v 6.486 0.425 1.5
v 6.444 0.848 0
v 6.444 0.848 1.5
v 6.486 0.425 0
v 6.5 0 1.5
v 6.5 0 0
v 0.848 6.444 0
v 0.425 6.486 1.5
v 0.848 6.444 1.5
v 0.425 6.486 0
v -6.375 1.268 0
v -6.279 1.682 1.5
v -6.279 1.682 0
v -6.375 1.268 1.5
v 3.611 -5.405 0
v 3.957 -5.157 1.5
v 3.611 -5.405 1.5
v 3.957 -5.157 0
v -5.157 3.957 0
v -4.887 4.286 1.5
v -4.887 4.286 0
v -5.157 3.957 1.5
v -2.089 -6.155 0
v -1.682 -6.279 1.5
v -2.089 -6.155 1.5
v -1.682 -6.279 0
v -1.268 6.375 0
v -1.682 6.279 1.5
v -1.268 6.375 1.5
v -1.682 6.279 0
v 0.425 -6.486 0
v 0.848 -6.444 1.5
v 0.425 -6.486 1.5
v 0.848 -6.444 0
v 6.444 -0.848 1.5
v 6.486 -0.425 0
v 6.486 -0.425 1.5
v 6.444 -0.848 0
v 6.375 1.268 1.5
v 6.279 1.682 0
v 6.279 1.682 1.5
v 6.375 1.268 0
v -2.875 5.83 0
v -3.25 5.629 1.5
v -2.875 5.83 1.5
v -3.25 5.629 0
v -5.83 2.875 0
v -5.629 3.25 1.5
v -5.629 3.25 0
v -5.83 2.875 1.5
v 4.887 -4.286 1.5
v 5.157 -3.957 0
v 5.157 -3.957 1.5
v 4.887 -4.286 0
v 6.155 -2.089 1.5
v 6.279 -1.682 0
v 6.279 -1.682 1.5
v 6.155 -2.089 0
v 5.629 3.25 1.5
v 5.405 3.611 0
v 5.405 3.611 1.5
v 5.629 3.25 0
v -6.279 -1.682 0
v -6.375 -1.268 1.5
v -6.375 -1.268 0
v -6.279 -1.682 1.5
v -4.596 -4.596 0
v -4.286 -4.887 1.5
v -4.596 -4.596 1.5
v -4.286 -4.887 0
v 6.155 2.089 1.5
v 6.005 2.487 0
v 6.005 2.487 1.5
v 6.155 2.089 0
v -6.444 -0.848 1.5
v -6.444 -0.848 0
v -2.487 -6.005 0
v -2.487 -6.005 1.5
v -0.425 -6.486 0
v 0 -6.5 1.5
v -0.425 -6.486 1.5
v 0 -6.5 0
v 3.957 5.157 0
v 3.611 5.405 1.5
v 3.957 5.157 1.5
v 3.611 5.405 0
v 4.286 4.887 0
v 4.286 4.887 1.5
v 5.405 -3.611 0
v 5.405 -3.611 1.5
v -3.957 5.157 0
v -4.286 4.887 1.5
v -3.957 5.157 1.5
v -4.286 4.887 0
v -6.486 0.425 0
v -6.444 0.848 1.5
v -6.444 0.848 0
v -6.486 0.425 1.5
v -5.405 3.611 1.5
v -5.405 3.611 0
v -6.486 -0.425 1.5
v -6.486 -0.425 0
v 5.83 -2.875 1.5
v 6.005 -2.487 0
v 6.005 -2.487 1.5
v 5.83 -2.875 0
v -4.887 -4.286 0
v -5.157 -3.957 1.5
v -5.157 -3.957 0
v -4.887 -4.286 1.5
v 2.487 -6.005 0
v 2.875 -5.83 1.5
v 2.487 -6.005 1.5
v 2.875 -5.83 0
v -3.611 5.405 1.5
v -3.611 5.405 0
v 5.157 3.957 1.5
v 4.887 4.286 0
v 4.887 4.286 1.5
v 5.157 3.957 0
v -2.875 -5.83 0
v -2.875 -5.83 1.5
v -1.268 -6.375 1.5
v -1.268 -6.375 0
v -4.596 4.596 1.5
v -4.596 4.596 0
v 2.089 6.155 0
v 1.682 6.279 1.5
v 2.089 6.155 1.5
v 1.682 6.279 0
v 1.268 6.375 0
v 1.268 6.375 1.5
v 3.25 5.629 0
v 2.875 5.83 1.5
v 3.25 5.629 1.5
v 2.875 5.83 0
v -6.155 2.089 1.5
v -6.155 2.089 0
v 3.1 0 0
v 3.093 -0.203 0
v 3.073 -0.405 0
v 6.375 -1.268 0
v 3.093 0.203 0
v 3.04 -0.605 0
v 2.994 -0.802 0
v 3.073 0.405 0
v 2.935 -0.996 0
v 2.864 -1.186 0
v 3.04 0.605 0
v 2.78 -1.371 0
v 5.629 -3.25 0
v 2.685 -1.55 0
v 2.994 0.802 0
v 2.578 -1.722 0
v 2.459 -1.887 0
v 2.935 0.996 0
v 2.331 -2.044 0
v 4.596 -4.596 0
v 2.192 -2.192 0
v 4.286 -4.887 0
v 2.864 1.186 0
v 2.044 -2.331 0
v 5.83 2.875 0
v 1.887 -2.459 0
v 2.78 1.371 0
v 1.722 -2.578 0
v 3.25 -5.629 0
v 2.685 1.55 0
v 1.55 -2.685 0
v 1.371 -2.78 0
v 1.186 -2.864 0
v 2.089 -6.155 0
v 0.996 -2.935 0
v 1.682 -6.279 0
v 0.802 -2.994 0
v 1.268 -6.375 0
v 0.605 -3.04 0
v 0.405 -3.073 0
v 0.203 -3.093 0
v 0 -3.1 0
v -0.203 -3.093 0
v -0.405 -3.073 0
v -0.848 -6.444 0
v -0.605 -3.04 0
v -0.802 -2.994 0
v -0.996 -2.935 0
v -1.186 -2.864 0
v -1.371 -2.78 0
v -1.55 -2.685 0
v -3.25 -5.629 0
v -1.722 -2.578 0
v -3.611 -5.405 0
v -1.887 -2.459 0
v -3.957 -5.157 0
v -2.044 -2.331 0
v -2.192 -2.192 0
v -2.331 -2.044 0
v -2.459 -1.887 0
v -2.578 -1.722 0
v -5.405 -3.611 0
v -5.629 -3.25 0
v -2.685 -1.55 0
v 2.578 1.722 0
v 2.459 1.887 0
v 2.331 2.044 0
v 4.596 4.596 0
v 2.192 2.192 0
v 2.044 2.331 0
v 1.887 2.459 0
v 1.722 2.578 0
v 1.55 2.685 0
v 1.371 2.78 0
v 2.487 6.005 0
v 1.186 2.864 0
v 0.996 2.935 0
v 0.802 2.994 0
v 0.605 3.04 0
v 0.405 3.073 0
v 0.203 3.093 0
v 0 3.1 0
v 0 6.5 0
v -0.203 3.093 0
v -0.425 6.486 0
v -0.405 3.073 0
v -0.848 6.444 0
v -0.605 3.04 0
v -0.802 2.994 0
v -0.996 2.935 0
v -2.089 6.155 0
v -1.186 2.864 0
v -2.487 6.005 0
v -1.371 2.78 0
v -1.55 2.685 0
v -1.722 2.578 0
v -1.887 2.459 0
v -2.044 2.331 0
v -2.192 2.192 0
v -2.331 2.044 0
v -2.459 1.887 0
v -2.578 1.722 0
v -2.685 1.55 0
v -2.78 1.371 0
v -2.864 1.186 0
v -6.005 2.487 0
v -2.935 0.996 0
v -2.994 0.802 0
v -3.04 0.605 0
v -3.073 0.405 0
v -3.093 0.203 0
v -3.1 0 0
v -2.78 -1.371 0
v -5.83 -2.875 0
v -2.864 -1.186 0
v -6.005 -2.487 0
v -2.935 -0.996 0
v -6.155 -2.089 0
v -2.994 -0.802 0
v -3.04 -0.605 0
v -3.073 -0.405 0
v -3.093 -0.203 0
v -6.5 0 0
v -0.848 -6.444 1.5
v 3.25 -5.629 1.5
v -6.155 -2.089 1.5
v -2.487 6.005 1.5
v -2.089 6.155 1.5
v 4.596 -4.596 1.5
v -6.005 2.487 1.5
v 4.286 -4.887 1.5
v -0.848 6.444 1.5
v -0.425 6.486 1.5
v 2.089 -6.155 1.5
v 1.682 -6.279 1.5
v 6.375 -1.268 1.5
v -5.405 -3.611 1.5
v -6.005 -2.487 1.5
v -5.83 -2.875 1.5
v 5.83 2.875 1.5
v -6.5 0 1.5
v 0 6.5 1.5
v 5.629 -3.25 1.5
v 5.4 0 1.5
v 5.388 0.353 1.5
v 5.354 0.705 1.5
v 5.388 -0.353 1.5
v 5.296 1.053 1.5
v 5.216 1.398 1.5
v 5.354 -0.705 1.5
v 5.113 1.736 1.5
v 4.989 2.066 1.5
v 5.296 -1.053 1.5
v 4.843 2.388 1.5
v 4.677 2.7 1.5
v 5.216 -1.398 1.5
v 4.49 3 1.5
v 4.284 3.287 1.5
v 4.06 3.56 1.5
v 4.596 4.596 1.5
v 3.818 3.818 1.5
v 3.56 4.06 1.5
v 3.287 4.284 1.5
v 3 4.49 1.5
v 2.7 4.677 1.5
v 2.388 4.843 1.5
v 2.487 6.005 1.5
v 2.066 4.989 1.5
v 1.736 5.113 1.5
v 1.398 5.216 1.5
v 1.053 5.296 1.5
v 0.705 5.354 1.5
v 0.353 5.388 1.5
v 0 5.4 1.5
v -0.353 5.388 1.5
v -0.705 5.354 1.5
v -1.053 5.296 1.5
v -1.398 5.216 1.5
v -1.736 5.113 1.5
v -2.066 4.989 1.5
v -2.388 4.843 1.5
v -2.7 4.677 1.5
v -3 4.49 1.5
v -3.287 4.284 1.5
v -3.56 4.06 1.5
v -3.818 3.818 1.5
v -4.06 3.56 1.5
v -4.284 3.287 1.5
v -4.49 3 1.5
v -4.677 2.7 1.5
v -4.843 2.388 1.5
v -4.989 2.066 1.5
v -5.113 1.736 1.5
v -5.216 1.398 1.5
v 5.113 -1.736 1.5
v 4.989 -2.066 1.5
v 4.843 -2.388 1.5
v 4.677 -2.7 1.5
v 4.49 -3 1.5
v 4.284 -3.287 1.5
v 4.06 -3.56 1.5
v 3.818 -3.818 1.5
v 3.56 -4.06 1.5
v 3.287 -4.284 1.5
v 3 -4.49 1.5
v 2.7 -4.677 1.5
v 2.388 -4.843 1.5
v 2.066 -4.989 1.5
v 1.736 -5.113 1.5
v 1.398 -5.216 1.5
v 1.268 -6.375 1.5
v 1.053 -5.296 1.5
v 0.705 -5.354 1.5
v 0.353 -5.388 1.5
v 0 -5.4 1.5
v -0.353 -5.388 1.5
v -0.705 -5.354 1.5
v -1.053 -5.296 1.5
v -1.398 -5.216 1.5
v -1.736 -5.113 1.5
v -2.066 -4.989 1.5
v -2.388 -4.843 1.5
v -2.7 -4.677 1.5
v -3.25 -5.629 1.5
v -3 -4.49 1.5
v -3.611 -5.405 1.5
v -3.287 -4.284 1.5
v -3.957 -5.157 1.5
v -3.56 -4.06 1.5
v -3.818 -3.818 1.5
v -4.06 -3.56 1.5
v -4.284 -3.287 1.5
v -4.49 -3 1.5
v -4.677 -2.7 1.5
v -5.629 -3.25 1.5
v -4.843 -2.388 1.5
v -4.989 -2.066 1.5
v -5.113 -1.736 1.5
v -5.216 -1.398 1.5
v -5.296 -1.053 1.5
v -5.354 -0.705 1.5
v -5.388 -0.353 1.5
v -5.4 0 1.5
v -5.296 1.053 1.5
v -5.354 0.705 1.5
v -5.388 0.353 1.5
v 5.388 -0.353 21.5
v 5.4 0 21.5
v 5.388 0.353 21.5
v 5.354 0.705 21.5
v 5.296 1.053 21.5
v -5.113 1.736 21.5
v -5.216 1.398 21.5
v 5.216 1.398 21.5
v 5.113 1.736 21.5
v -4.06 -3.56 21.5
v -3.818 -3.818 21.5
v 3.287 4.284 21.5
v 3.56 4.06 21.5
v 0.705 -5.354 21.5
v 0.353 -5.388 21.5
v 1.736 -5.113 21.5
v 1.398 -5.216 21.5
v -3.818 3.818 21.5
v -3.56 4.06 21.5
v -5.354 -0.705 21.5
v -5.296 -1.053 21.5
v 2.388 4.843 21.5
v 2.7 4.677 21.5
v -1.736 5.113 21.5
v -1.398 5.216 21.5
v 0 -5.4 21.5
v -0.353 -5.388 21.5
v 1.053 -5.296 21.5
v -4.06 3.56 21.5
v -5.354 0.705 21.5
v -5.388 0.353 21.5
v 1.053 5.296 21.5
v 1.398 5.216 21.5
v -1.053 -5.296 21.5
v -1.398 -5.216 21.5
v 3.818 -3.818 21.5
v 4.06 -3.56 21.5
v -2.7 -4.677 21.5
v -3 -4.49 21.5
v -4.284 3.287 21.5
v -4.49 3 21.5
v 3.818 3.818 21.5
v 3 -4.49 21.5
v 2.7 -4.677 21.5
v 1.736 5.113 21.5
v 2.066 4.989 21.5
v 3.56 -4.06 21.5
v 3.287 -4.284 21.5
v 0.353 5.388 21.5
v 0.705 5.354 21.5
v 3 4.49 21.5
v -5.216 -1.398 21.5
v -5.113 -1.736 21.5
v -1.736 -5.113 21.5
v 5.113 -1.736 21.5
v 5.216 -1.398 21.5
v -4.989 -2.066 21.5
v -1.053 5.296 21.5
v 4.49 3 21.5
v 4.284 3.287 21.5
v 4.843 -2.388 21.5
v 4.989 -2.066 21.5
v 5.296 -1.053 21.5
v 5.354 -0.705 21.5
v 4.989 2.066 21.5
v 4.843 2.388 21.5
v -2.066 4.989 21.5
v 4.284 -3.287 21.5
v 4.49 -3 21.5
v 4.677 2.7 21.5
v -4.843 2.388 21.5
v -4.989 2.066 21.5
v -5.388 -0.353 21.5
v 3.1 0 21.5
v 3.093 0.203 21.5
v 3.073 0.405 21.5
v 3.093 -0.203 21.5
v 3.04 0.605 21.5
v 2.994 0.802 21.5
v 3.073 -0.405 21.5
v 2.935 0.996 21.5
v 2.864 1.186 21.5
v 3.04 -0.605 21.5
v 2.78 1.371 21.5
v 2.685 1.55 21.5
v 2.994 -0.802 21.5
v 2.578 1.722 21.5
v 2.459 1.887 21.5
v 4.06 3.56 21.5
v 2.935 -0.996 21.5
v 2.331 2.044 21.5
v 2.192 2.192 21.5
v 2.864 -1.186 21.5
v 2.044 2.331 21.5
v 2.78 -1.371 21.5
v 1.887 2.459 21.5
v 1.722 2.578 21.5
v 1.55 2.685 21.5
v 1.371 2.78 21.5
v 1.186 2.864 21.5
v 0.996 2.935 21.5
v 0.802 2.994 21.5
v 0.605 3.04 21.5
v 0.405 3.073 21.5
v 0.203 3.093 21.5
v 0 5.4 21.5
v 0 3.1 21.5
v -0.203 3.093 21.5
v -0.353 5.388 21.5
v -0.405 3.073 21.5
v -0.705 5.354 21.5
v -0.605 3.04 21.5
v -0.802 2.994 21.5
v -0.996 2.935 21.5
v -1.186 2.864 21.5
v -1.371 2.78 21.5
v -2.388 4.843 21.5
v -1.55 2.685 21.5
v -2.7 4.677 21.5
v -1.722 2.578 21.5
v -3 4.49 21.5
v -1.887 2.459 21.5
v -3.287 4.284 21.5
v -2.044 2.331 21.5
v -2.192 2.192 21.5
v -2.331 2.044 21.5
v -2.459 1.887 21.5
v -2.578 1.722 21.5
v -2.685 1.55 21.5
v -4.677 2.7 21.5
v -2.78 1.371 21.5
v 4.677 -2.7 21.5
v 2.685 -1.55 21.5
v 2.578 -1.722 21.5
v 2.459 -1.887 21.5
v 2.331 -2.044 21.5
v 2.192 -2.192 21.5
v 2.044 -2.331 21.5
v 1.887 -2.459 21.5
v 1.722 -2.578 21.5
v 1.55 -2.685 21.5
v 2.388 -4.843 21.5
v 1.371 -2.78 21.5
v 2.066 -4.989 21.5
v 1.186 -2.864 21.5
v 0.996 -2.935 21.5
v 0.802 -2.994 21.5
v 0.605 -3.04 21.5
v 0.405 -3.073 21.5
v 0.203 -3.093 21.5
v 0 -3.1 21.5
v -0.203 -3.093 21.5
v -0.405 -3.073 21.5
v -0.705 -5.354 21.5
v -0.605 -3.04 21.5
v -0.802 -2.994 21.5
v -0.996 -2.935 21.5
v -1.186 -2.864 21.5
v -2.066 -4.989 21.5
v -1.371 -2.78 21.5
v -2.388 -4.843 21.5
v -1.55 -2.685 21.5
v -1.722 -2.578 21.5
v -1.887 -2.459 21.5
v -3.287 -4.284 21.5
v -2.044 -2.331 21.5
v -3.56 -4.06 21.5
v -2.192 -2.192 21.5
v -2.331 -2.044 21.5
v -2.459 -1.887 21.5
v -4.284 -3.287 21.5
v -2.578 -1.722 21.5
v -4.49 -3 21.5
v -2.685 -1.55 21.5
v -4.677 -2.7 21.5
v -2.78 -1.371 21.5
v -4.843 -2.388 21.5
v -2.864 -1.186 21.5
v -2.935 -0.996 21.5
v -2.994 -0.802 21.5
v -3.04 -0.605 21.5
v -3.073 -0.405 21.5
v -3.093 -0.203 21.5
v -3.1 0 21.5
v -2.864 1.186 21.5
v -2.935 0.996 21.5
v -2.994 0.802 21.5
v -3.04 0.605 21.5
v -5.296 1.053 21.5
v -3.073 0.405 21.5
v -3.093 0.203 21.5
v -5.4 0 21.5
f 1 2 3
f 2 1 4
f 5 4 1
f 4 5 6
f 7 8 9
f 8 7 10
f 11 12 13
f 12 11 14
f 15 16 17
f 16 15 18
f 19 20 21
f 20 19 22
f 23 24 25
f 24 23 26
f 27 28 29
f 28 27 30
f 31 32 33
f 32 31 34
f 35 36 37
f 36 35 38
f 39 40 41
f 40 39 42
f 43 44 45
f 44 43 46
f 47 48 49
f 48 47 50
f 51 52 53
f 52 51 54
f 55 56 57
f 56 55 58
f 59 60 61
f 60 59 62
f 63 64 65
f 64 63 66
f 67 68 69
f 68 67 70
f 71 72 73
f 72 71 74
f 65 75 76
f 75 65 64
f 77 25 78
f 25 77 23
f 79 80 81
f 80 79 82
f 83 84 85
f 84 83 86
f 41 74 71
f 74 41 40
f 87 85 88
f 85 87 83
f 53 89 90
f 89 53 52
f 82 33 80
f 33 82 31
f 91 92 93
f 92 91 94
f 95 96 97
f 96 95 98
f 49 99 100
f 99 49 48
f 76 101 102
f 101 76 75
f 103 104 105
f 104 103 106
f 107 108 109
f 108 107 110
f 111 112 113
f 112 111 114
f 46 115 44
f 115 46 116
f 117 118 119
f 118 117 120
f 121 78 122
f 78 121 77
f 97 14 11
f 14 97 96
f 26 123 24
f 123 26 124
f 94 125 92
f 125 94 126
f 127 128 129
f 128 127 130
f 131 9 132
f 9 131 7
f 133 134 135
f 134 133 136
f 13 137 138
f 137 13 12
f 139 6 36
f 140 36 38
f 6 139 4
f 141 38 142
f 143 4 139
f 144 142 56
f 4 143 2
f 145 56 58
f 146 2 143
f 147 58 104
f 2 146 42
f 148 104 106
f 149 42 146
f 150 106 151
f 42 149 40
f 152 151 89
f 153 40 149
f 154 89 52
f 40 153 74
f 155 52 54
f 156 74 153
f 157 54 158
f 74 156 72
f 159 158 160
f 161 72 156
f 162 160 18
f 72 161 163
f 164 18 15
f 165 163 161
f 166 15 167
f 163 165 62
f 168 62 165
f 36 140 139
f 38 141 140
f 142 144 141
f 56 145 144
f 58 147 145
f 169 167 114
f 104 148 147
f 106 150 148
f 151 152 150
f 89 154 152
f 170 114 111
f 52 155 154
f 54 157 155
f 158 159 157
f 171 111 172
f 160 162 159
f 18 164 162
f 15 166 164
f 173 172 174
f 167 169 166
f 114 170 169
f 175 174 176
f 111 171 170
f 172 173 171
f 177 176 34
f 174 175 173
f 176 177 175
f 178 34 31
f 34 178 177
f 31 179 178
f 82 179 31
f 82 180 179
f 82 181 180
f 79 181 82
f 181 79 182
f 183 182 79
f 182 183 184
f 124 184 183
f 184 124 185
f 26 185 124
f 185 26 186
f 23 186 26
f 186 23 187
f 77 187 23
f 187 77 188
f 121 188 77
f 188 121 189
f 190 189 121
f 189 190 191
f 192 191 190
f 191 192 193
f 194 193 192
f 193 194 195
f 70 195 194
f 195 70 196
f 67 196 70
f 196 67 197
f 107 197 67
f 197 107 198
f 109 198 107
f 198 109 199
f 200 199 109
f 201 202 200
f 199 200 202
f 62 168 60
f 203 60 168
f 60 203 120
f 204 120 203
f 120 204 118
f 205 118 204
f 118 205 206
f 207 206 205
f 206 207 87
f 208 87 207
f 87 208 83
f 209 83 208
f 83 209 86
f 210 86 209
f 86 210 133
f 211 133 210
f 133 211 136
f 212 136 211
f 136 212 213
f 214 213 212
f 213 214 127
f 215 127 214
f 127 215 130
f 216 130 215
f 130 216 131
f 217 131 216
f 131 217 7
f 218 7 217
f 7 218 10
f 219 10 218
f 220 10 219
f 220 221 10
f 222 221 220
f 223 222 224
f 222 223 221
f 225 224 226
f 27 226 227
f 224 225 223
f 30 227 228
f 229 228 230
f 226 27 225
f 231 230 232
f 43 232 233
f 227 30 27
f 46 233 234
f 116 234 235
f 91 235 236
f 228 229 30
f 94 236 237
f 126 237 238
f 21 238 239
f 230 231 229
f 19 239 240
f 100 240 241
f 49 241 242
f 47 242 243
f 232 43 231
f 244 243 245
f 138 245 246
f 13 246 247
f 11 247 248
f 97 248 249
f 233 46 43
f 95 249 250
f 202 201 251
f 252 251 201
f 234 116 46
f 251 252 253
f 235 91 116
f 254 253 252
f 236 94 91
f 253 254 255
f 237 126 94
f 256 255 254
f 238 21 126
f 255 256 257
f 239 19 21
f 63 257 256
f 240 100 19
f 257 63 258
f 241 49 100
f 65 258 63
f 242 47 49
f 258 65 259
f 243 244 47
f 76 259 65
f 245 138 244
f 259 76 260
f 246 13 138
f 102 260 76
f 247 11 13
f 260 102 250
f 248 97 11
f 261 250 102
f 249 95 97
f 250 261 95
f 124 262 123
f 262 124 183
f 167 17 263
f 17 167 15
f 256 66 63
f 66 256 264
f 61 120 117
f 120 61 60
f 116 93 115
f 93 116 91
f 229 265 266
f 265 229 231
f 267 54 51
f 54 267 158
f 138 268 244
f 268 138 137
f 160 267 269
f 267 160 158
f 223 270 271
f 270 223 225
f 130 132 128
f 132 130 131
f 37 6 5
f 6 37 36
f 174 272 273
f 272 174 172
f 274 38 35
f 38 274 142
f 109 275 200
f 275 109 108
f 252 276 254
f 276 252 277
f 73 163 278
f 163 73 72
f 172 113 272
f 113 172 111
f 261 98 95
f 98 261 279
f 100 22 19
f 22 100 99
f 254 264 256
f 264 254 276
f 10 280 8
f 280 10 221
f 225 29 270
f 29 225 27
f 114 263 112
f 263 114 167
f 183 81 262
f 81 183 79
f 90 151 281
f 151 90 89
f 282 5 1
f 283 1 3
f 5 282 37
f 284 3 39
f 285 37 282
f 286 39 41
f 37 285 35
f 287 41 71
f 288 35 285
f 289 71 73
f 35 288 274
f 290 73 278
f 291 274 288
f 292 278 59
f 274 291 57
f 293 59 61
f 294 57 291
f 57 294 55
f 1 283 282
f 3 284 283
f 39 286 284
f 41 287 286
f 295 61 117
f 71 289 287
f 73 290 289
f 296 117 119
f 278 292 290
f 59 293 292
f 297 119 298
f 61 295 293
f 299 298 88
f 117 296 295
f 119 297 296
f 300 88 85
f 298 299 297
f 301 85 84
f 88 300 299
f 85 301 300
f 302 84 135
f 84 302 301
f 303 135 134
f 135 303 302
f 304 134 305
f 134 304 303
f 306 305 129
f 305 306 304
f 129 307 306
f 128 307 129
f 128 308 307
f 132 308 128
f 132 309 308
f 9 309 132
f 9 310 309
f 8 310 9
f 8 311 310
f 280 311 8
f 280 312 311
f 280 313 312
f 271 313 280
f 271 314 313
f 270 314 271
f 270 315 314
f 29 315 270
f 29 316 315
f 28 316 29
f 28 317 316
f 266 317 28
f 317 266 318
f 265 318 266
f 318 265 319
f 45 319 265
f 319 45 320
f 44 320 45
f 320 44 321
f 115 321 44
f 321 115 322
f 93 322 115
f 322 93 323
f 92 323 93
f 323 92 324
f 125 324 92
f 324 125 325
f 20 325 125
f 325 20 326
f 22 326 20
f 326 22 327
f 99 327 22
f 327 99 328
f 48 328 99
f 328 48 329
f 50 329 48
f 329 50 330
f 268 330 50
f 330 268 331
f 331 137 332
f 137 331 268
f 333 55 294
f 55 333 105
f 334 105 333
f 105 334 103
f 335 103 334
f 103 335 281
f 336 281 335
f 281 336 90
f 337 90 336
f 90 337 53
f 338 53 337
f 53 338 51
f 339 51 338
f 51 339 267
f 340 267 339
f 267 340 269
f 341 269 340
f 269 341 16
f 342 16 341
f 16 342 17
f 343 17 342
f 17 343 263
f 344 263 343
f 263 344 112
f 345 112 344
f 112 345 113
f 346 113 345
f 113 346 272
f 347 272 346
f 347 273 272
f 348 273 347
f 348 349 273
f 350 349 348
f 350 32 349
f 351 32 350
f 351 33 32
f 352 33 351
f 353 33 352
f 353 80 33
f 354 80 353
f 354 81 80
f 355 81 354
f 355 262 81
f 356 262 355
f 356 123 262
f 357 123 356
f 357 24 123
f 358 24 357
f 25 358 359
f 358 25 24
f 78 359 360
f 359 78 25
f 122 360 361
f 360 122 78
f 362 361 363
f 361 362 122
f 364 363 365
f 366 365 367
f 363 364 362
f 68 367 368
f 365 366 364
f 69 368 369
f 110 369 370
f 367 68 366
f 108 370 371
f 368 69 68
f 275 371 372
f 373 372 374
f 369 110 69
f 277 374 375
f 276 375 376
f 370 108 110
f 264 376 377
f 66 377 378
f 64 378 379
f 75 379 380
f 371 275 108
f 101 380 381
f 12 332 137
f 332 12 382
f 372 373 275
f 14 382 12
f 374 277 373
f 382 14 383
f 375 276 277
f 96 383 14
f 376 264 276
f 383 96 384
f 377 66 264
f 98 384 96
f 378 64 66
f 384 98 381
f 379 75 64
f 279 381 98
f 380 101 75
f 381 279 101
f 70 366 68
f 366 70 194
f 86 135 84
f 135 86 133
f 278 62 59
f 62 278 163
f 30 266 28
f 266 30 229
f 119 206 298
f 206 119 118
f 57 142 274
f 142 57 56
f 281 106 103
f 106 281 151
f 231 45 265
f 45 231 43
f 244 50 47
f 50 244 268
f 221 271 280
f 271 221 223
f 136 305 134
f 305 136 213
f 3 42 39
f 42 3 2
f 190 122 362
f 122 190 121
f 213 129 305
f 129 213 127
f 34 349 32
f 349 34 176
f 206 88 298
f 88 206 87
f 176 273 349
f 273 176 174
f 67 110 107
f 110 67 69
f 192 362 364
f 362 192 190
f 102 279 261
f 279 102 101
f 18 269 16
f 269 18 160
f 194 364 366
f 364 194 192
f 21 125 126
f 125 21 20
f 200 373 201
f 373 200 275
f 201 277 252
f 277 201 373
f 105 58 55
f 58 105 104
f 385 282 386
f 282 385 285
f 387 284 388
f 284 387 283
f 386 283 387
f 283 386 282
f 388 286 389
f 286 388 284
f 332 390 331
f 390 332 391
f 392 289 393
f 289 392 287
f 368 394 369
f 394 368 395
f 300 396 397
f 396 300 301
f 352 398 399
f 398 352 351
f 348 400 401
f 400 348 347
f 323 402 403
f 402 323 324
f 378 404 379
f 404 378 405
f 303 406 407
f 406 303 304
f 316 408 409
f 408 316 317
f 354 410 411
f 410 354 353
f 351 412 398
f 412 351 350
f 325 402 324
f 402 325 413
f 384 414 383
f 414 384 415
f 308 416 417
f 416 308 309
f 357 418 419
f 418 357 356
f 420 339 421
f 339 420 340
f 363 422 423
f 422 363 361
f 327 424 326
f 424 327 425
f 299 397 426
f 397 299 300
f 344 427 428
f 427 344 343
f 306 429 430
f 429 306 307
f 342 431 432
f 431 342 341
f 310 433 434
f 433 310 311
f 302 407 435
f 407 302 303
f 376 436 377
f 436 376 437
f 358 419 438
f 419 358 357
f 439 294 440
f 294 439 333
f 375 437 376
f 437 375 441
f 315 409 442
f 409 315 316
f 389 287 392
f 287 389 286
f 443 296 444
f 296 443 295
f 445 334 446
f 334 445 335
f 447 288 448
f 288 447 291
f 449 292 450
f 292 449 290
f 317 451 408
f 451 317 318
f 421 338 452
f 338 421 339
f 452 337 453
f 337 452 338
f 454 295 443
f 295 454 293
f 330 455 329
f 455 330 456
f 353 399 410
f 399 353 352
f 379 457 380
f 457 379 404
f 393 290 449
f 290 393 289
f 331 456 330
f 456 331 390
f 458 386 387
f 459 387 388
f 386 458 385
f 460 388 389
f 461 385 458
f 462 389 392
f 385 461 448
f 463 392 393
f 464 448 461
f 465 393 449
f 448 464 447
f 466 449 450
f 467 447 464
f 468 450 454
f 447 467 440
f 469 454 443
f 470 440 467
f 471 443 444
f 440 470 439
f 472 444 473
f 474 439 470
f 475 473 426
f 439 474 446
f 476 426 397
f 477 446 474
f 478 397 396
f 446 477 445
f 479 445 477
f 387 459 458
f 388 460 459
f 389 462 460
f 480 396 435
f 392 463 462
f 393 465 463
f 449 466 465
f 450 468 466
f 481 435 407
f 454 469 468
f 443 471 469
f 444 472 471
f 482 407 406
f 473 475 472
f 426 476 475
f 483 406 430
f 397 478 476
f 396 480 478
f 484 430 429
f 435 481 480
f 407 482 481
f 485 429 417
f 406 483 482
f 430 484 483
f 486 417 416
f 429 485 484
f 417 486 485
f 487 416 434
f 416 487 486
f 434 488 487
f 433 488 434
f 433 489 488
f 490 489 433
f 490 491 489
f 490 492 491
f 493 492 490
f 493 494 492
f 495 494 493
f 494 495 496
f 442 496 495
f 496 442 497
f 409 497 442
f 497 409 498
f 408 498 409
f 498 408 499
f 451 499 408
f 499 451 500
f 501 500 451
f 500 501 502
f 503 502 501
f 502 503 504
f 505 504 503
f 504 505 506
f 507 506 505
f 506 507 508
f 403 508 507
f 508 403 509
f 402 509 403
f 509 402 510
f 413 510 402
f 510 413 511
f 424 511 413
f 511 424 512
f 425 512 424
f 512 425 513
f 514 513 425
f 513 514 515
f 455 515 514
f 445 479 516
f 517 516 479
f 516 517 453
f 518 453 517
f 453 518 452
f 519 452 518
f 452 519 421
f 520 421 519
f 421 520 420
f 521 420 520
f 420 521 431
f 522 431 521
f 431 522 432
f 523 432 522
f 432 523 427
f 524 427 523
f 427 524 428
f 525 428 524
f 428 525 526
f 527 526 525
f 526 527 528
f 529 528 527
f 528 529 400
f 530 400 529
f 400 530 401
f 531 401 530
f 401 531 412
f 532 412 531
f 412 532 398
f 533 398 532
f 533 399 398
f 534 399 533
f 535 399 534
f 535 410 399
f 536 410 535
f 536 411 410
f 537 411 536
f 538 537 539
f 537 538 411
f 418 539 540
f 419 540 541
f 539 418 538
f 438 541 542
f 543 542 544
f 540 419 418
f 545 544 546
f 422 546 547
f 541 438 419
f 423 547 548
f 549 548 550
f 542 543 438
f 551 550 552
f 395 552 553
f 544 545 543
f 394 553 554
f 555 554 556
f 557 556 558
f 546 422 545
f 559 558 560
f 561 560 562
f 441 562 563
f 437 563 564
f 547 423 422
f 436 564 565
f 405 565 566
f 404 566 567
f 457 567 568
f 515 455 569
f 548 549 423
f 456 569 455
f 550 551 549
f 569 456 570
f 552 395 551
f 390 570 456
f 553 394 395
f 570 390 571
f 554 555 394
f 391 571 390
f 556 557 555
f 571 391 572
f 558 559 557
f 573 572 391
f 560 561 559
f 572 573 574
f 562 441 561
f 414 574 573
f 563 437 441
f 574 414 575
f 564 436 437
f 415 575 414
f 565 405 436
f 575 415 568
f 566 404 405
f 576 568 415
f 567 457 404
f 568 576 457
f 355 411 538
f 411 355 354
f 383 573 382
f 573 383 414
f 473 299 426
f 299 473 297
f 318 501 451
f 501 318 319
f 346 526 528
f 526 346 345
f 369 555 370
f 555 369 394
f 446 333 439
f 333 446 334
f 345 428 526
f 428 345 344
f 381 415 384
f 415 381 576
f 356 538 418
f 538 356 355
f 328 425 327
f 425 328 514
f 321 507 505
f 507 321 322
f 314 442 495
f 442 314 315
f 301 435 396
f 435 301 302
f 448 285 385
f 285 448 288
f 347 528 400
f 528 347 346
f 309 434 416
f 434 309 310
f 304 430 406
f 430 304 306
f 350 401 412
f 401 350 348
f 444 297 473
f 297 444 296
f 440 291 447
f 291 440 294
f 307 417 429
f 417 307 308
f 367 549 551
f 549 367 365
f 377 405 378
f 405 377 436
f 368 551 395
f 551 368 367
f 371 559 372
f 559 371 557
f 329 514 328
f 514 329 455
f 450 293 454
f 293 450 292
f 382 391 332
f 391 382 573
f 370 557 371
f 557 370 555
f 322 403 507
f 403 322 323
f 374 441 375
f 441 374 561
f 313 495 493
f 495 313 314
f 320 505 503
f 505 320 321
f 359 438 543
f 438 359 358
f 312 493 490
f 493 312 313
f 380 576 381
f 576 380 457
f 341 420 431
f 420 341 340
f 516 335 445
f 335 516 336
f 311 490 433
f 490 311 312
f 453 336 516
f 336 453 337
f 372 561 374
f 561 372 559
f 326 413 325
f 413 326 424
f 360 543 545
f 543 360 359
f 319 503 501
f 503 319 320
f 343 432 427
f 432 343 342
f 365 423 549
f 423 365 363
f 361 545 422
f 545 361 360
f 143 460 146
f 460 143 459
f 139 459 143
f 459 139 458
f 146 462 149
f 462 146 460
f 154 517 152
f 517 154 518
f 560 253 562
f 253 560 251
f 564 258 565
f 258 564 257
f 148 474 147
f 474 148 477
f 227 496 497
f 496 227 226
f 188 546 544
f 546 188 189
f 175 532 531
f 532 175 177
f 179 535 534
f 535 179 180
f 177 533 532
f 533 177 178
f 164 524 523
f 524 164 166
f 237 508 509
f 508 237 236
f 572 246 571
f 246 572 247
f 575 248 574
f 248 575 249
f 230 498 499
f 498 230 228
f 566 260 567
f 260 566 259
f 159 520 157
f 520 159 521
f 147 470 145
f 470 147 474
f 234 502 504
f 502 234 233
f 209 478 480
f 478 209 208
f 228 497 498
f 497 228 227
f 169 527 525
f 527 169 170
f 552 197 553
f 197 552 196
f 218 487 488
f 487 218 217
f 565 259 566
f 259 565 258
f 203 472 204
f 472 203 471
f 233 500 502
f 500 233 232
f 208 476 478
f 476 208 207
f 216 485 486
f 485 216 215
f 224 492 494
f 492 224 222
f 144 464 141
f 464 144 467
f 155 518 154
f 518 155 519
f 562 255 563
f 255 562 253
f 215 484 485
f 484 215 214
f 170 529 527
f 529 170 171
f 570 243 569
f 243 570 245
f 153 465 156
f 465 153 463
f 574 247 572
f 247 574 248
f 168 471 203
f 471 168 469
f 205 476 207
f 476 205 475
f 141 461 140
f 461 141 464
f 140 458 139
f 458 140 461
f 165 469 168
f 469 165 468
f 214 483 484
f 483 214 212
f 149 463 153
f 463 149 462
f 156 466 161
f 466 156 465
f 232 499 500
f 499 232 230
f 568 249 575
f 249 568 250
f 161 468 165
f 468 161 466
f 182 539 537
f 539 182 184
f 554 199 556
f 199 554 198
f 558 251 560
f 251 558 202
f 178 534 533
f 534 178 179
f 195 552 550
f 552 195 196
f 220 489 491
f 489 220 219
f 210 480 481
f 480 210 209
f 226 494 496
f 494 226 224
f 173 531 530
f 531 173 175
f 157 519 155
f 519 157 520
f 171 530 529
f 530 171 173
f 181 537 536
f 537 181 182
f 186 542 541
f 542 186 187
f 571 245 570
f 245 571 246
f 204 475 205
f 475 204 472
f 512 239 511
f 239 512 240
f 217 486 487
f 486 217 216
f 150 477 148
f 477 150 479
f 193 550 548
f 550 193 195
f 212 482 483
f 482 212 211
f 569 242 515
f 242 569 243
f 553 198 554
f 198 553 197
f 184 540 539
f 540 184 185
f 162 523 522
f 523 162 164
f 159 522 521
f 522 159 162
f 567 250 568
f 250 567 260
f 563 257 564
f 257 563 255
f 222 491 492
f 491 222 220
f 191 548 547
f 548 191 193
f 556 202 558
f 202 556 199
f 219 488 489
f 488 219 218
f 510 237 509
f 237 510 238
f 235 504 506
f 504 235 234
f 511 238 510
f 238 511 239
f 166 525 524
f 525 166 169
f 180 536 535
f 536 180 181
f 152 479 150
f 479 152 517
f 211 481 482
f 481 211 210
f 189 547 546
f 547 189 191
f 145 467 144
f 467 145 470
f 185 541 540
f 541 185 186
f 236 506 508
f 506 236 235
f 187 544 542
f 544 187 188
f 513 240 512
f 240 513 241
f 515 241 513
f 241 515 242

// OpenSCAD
// Adapter sleeve: 0.2 mL PCR tube for 1.5 mL tube rack hole
// Print orientation: collar on bed (z = 0), sleeve body builds upward

$fn = 96;

// ---- Dimensions (mm) ----
collar_d        = 13;     // collar outer diameter
collar_t        = 1.5;    // collar thickness (z = 0 to 1.5)
sleeve_d        = 10.8;   // sleeve body outer diameter
sleeve_h        = 20;     // sleeve body height (z = 1.5 to 21.5)
bore_d          = 6.2;    // through-bore diameter
eps             = 0.5;    // cutter overshoot past faces

total_h = collar_t + sleeve_h; // 21.5

difference() {
    union() {
        // Collar
        cylinder(d = collar_d, h = collar_t);
        // Sleeve body, resting on top of the collar
        translate([0, 0, collar_t])
            cylinder(d = sleeve_d, h = sleeve_h);
    }
    // Through bore
    translate([0, 0, -eps])
        cylinder(d = bore_d, h = total_h + 2 * eps);
}
